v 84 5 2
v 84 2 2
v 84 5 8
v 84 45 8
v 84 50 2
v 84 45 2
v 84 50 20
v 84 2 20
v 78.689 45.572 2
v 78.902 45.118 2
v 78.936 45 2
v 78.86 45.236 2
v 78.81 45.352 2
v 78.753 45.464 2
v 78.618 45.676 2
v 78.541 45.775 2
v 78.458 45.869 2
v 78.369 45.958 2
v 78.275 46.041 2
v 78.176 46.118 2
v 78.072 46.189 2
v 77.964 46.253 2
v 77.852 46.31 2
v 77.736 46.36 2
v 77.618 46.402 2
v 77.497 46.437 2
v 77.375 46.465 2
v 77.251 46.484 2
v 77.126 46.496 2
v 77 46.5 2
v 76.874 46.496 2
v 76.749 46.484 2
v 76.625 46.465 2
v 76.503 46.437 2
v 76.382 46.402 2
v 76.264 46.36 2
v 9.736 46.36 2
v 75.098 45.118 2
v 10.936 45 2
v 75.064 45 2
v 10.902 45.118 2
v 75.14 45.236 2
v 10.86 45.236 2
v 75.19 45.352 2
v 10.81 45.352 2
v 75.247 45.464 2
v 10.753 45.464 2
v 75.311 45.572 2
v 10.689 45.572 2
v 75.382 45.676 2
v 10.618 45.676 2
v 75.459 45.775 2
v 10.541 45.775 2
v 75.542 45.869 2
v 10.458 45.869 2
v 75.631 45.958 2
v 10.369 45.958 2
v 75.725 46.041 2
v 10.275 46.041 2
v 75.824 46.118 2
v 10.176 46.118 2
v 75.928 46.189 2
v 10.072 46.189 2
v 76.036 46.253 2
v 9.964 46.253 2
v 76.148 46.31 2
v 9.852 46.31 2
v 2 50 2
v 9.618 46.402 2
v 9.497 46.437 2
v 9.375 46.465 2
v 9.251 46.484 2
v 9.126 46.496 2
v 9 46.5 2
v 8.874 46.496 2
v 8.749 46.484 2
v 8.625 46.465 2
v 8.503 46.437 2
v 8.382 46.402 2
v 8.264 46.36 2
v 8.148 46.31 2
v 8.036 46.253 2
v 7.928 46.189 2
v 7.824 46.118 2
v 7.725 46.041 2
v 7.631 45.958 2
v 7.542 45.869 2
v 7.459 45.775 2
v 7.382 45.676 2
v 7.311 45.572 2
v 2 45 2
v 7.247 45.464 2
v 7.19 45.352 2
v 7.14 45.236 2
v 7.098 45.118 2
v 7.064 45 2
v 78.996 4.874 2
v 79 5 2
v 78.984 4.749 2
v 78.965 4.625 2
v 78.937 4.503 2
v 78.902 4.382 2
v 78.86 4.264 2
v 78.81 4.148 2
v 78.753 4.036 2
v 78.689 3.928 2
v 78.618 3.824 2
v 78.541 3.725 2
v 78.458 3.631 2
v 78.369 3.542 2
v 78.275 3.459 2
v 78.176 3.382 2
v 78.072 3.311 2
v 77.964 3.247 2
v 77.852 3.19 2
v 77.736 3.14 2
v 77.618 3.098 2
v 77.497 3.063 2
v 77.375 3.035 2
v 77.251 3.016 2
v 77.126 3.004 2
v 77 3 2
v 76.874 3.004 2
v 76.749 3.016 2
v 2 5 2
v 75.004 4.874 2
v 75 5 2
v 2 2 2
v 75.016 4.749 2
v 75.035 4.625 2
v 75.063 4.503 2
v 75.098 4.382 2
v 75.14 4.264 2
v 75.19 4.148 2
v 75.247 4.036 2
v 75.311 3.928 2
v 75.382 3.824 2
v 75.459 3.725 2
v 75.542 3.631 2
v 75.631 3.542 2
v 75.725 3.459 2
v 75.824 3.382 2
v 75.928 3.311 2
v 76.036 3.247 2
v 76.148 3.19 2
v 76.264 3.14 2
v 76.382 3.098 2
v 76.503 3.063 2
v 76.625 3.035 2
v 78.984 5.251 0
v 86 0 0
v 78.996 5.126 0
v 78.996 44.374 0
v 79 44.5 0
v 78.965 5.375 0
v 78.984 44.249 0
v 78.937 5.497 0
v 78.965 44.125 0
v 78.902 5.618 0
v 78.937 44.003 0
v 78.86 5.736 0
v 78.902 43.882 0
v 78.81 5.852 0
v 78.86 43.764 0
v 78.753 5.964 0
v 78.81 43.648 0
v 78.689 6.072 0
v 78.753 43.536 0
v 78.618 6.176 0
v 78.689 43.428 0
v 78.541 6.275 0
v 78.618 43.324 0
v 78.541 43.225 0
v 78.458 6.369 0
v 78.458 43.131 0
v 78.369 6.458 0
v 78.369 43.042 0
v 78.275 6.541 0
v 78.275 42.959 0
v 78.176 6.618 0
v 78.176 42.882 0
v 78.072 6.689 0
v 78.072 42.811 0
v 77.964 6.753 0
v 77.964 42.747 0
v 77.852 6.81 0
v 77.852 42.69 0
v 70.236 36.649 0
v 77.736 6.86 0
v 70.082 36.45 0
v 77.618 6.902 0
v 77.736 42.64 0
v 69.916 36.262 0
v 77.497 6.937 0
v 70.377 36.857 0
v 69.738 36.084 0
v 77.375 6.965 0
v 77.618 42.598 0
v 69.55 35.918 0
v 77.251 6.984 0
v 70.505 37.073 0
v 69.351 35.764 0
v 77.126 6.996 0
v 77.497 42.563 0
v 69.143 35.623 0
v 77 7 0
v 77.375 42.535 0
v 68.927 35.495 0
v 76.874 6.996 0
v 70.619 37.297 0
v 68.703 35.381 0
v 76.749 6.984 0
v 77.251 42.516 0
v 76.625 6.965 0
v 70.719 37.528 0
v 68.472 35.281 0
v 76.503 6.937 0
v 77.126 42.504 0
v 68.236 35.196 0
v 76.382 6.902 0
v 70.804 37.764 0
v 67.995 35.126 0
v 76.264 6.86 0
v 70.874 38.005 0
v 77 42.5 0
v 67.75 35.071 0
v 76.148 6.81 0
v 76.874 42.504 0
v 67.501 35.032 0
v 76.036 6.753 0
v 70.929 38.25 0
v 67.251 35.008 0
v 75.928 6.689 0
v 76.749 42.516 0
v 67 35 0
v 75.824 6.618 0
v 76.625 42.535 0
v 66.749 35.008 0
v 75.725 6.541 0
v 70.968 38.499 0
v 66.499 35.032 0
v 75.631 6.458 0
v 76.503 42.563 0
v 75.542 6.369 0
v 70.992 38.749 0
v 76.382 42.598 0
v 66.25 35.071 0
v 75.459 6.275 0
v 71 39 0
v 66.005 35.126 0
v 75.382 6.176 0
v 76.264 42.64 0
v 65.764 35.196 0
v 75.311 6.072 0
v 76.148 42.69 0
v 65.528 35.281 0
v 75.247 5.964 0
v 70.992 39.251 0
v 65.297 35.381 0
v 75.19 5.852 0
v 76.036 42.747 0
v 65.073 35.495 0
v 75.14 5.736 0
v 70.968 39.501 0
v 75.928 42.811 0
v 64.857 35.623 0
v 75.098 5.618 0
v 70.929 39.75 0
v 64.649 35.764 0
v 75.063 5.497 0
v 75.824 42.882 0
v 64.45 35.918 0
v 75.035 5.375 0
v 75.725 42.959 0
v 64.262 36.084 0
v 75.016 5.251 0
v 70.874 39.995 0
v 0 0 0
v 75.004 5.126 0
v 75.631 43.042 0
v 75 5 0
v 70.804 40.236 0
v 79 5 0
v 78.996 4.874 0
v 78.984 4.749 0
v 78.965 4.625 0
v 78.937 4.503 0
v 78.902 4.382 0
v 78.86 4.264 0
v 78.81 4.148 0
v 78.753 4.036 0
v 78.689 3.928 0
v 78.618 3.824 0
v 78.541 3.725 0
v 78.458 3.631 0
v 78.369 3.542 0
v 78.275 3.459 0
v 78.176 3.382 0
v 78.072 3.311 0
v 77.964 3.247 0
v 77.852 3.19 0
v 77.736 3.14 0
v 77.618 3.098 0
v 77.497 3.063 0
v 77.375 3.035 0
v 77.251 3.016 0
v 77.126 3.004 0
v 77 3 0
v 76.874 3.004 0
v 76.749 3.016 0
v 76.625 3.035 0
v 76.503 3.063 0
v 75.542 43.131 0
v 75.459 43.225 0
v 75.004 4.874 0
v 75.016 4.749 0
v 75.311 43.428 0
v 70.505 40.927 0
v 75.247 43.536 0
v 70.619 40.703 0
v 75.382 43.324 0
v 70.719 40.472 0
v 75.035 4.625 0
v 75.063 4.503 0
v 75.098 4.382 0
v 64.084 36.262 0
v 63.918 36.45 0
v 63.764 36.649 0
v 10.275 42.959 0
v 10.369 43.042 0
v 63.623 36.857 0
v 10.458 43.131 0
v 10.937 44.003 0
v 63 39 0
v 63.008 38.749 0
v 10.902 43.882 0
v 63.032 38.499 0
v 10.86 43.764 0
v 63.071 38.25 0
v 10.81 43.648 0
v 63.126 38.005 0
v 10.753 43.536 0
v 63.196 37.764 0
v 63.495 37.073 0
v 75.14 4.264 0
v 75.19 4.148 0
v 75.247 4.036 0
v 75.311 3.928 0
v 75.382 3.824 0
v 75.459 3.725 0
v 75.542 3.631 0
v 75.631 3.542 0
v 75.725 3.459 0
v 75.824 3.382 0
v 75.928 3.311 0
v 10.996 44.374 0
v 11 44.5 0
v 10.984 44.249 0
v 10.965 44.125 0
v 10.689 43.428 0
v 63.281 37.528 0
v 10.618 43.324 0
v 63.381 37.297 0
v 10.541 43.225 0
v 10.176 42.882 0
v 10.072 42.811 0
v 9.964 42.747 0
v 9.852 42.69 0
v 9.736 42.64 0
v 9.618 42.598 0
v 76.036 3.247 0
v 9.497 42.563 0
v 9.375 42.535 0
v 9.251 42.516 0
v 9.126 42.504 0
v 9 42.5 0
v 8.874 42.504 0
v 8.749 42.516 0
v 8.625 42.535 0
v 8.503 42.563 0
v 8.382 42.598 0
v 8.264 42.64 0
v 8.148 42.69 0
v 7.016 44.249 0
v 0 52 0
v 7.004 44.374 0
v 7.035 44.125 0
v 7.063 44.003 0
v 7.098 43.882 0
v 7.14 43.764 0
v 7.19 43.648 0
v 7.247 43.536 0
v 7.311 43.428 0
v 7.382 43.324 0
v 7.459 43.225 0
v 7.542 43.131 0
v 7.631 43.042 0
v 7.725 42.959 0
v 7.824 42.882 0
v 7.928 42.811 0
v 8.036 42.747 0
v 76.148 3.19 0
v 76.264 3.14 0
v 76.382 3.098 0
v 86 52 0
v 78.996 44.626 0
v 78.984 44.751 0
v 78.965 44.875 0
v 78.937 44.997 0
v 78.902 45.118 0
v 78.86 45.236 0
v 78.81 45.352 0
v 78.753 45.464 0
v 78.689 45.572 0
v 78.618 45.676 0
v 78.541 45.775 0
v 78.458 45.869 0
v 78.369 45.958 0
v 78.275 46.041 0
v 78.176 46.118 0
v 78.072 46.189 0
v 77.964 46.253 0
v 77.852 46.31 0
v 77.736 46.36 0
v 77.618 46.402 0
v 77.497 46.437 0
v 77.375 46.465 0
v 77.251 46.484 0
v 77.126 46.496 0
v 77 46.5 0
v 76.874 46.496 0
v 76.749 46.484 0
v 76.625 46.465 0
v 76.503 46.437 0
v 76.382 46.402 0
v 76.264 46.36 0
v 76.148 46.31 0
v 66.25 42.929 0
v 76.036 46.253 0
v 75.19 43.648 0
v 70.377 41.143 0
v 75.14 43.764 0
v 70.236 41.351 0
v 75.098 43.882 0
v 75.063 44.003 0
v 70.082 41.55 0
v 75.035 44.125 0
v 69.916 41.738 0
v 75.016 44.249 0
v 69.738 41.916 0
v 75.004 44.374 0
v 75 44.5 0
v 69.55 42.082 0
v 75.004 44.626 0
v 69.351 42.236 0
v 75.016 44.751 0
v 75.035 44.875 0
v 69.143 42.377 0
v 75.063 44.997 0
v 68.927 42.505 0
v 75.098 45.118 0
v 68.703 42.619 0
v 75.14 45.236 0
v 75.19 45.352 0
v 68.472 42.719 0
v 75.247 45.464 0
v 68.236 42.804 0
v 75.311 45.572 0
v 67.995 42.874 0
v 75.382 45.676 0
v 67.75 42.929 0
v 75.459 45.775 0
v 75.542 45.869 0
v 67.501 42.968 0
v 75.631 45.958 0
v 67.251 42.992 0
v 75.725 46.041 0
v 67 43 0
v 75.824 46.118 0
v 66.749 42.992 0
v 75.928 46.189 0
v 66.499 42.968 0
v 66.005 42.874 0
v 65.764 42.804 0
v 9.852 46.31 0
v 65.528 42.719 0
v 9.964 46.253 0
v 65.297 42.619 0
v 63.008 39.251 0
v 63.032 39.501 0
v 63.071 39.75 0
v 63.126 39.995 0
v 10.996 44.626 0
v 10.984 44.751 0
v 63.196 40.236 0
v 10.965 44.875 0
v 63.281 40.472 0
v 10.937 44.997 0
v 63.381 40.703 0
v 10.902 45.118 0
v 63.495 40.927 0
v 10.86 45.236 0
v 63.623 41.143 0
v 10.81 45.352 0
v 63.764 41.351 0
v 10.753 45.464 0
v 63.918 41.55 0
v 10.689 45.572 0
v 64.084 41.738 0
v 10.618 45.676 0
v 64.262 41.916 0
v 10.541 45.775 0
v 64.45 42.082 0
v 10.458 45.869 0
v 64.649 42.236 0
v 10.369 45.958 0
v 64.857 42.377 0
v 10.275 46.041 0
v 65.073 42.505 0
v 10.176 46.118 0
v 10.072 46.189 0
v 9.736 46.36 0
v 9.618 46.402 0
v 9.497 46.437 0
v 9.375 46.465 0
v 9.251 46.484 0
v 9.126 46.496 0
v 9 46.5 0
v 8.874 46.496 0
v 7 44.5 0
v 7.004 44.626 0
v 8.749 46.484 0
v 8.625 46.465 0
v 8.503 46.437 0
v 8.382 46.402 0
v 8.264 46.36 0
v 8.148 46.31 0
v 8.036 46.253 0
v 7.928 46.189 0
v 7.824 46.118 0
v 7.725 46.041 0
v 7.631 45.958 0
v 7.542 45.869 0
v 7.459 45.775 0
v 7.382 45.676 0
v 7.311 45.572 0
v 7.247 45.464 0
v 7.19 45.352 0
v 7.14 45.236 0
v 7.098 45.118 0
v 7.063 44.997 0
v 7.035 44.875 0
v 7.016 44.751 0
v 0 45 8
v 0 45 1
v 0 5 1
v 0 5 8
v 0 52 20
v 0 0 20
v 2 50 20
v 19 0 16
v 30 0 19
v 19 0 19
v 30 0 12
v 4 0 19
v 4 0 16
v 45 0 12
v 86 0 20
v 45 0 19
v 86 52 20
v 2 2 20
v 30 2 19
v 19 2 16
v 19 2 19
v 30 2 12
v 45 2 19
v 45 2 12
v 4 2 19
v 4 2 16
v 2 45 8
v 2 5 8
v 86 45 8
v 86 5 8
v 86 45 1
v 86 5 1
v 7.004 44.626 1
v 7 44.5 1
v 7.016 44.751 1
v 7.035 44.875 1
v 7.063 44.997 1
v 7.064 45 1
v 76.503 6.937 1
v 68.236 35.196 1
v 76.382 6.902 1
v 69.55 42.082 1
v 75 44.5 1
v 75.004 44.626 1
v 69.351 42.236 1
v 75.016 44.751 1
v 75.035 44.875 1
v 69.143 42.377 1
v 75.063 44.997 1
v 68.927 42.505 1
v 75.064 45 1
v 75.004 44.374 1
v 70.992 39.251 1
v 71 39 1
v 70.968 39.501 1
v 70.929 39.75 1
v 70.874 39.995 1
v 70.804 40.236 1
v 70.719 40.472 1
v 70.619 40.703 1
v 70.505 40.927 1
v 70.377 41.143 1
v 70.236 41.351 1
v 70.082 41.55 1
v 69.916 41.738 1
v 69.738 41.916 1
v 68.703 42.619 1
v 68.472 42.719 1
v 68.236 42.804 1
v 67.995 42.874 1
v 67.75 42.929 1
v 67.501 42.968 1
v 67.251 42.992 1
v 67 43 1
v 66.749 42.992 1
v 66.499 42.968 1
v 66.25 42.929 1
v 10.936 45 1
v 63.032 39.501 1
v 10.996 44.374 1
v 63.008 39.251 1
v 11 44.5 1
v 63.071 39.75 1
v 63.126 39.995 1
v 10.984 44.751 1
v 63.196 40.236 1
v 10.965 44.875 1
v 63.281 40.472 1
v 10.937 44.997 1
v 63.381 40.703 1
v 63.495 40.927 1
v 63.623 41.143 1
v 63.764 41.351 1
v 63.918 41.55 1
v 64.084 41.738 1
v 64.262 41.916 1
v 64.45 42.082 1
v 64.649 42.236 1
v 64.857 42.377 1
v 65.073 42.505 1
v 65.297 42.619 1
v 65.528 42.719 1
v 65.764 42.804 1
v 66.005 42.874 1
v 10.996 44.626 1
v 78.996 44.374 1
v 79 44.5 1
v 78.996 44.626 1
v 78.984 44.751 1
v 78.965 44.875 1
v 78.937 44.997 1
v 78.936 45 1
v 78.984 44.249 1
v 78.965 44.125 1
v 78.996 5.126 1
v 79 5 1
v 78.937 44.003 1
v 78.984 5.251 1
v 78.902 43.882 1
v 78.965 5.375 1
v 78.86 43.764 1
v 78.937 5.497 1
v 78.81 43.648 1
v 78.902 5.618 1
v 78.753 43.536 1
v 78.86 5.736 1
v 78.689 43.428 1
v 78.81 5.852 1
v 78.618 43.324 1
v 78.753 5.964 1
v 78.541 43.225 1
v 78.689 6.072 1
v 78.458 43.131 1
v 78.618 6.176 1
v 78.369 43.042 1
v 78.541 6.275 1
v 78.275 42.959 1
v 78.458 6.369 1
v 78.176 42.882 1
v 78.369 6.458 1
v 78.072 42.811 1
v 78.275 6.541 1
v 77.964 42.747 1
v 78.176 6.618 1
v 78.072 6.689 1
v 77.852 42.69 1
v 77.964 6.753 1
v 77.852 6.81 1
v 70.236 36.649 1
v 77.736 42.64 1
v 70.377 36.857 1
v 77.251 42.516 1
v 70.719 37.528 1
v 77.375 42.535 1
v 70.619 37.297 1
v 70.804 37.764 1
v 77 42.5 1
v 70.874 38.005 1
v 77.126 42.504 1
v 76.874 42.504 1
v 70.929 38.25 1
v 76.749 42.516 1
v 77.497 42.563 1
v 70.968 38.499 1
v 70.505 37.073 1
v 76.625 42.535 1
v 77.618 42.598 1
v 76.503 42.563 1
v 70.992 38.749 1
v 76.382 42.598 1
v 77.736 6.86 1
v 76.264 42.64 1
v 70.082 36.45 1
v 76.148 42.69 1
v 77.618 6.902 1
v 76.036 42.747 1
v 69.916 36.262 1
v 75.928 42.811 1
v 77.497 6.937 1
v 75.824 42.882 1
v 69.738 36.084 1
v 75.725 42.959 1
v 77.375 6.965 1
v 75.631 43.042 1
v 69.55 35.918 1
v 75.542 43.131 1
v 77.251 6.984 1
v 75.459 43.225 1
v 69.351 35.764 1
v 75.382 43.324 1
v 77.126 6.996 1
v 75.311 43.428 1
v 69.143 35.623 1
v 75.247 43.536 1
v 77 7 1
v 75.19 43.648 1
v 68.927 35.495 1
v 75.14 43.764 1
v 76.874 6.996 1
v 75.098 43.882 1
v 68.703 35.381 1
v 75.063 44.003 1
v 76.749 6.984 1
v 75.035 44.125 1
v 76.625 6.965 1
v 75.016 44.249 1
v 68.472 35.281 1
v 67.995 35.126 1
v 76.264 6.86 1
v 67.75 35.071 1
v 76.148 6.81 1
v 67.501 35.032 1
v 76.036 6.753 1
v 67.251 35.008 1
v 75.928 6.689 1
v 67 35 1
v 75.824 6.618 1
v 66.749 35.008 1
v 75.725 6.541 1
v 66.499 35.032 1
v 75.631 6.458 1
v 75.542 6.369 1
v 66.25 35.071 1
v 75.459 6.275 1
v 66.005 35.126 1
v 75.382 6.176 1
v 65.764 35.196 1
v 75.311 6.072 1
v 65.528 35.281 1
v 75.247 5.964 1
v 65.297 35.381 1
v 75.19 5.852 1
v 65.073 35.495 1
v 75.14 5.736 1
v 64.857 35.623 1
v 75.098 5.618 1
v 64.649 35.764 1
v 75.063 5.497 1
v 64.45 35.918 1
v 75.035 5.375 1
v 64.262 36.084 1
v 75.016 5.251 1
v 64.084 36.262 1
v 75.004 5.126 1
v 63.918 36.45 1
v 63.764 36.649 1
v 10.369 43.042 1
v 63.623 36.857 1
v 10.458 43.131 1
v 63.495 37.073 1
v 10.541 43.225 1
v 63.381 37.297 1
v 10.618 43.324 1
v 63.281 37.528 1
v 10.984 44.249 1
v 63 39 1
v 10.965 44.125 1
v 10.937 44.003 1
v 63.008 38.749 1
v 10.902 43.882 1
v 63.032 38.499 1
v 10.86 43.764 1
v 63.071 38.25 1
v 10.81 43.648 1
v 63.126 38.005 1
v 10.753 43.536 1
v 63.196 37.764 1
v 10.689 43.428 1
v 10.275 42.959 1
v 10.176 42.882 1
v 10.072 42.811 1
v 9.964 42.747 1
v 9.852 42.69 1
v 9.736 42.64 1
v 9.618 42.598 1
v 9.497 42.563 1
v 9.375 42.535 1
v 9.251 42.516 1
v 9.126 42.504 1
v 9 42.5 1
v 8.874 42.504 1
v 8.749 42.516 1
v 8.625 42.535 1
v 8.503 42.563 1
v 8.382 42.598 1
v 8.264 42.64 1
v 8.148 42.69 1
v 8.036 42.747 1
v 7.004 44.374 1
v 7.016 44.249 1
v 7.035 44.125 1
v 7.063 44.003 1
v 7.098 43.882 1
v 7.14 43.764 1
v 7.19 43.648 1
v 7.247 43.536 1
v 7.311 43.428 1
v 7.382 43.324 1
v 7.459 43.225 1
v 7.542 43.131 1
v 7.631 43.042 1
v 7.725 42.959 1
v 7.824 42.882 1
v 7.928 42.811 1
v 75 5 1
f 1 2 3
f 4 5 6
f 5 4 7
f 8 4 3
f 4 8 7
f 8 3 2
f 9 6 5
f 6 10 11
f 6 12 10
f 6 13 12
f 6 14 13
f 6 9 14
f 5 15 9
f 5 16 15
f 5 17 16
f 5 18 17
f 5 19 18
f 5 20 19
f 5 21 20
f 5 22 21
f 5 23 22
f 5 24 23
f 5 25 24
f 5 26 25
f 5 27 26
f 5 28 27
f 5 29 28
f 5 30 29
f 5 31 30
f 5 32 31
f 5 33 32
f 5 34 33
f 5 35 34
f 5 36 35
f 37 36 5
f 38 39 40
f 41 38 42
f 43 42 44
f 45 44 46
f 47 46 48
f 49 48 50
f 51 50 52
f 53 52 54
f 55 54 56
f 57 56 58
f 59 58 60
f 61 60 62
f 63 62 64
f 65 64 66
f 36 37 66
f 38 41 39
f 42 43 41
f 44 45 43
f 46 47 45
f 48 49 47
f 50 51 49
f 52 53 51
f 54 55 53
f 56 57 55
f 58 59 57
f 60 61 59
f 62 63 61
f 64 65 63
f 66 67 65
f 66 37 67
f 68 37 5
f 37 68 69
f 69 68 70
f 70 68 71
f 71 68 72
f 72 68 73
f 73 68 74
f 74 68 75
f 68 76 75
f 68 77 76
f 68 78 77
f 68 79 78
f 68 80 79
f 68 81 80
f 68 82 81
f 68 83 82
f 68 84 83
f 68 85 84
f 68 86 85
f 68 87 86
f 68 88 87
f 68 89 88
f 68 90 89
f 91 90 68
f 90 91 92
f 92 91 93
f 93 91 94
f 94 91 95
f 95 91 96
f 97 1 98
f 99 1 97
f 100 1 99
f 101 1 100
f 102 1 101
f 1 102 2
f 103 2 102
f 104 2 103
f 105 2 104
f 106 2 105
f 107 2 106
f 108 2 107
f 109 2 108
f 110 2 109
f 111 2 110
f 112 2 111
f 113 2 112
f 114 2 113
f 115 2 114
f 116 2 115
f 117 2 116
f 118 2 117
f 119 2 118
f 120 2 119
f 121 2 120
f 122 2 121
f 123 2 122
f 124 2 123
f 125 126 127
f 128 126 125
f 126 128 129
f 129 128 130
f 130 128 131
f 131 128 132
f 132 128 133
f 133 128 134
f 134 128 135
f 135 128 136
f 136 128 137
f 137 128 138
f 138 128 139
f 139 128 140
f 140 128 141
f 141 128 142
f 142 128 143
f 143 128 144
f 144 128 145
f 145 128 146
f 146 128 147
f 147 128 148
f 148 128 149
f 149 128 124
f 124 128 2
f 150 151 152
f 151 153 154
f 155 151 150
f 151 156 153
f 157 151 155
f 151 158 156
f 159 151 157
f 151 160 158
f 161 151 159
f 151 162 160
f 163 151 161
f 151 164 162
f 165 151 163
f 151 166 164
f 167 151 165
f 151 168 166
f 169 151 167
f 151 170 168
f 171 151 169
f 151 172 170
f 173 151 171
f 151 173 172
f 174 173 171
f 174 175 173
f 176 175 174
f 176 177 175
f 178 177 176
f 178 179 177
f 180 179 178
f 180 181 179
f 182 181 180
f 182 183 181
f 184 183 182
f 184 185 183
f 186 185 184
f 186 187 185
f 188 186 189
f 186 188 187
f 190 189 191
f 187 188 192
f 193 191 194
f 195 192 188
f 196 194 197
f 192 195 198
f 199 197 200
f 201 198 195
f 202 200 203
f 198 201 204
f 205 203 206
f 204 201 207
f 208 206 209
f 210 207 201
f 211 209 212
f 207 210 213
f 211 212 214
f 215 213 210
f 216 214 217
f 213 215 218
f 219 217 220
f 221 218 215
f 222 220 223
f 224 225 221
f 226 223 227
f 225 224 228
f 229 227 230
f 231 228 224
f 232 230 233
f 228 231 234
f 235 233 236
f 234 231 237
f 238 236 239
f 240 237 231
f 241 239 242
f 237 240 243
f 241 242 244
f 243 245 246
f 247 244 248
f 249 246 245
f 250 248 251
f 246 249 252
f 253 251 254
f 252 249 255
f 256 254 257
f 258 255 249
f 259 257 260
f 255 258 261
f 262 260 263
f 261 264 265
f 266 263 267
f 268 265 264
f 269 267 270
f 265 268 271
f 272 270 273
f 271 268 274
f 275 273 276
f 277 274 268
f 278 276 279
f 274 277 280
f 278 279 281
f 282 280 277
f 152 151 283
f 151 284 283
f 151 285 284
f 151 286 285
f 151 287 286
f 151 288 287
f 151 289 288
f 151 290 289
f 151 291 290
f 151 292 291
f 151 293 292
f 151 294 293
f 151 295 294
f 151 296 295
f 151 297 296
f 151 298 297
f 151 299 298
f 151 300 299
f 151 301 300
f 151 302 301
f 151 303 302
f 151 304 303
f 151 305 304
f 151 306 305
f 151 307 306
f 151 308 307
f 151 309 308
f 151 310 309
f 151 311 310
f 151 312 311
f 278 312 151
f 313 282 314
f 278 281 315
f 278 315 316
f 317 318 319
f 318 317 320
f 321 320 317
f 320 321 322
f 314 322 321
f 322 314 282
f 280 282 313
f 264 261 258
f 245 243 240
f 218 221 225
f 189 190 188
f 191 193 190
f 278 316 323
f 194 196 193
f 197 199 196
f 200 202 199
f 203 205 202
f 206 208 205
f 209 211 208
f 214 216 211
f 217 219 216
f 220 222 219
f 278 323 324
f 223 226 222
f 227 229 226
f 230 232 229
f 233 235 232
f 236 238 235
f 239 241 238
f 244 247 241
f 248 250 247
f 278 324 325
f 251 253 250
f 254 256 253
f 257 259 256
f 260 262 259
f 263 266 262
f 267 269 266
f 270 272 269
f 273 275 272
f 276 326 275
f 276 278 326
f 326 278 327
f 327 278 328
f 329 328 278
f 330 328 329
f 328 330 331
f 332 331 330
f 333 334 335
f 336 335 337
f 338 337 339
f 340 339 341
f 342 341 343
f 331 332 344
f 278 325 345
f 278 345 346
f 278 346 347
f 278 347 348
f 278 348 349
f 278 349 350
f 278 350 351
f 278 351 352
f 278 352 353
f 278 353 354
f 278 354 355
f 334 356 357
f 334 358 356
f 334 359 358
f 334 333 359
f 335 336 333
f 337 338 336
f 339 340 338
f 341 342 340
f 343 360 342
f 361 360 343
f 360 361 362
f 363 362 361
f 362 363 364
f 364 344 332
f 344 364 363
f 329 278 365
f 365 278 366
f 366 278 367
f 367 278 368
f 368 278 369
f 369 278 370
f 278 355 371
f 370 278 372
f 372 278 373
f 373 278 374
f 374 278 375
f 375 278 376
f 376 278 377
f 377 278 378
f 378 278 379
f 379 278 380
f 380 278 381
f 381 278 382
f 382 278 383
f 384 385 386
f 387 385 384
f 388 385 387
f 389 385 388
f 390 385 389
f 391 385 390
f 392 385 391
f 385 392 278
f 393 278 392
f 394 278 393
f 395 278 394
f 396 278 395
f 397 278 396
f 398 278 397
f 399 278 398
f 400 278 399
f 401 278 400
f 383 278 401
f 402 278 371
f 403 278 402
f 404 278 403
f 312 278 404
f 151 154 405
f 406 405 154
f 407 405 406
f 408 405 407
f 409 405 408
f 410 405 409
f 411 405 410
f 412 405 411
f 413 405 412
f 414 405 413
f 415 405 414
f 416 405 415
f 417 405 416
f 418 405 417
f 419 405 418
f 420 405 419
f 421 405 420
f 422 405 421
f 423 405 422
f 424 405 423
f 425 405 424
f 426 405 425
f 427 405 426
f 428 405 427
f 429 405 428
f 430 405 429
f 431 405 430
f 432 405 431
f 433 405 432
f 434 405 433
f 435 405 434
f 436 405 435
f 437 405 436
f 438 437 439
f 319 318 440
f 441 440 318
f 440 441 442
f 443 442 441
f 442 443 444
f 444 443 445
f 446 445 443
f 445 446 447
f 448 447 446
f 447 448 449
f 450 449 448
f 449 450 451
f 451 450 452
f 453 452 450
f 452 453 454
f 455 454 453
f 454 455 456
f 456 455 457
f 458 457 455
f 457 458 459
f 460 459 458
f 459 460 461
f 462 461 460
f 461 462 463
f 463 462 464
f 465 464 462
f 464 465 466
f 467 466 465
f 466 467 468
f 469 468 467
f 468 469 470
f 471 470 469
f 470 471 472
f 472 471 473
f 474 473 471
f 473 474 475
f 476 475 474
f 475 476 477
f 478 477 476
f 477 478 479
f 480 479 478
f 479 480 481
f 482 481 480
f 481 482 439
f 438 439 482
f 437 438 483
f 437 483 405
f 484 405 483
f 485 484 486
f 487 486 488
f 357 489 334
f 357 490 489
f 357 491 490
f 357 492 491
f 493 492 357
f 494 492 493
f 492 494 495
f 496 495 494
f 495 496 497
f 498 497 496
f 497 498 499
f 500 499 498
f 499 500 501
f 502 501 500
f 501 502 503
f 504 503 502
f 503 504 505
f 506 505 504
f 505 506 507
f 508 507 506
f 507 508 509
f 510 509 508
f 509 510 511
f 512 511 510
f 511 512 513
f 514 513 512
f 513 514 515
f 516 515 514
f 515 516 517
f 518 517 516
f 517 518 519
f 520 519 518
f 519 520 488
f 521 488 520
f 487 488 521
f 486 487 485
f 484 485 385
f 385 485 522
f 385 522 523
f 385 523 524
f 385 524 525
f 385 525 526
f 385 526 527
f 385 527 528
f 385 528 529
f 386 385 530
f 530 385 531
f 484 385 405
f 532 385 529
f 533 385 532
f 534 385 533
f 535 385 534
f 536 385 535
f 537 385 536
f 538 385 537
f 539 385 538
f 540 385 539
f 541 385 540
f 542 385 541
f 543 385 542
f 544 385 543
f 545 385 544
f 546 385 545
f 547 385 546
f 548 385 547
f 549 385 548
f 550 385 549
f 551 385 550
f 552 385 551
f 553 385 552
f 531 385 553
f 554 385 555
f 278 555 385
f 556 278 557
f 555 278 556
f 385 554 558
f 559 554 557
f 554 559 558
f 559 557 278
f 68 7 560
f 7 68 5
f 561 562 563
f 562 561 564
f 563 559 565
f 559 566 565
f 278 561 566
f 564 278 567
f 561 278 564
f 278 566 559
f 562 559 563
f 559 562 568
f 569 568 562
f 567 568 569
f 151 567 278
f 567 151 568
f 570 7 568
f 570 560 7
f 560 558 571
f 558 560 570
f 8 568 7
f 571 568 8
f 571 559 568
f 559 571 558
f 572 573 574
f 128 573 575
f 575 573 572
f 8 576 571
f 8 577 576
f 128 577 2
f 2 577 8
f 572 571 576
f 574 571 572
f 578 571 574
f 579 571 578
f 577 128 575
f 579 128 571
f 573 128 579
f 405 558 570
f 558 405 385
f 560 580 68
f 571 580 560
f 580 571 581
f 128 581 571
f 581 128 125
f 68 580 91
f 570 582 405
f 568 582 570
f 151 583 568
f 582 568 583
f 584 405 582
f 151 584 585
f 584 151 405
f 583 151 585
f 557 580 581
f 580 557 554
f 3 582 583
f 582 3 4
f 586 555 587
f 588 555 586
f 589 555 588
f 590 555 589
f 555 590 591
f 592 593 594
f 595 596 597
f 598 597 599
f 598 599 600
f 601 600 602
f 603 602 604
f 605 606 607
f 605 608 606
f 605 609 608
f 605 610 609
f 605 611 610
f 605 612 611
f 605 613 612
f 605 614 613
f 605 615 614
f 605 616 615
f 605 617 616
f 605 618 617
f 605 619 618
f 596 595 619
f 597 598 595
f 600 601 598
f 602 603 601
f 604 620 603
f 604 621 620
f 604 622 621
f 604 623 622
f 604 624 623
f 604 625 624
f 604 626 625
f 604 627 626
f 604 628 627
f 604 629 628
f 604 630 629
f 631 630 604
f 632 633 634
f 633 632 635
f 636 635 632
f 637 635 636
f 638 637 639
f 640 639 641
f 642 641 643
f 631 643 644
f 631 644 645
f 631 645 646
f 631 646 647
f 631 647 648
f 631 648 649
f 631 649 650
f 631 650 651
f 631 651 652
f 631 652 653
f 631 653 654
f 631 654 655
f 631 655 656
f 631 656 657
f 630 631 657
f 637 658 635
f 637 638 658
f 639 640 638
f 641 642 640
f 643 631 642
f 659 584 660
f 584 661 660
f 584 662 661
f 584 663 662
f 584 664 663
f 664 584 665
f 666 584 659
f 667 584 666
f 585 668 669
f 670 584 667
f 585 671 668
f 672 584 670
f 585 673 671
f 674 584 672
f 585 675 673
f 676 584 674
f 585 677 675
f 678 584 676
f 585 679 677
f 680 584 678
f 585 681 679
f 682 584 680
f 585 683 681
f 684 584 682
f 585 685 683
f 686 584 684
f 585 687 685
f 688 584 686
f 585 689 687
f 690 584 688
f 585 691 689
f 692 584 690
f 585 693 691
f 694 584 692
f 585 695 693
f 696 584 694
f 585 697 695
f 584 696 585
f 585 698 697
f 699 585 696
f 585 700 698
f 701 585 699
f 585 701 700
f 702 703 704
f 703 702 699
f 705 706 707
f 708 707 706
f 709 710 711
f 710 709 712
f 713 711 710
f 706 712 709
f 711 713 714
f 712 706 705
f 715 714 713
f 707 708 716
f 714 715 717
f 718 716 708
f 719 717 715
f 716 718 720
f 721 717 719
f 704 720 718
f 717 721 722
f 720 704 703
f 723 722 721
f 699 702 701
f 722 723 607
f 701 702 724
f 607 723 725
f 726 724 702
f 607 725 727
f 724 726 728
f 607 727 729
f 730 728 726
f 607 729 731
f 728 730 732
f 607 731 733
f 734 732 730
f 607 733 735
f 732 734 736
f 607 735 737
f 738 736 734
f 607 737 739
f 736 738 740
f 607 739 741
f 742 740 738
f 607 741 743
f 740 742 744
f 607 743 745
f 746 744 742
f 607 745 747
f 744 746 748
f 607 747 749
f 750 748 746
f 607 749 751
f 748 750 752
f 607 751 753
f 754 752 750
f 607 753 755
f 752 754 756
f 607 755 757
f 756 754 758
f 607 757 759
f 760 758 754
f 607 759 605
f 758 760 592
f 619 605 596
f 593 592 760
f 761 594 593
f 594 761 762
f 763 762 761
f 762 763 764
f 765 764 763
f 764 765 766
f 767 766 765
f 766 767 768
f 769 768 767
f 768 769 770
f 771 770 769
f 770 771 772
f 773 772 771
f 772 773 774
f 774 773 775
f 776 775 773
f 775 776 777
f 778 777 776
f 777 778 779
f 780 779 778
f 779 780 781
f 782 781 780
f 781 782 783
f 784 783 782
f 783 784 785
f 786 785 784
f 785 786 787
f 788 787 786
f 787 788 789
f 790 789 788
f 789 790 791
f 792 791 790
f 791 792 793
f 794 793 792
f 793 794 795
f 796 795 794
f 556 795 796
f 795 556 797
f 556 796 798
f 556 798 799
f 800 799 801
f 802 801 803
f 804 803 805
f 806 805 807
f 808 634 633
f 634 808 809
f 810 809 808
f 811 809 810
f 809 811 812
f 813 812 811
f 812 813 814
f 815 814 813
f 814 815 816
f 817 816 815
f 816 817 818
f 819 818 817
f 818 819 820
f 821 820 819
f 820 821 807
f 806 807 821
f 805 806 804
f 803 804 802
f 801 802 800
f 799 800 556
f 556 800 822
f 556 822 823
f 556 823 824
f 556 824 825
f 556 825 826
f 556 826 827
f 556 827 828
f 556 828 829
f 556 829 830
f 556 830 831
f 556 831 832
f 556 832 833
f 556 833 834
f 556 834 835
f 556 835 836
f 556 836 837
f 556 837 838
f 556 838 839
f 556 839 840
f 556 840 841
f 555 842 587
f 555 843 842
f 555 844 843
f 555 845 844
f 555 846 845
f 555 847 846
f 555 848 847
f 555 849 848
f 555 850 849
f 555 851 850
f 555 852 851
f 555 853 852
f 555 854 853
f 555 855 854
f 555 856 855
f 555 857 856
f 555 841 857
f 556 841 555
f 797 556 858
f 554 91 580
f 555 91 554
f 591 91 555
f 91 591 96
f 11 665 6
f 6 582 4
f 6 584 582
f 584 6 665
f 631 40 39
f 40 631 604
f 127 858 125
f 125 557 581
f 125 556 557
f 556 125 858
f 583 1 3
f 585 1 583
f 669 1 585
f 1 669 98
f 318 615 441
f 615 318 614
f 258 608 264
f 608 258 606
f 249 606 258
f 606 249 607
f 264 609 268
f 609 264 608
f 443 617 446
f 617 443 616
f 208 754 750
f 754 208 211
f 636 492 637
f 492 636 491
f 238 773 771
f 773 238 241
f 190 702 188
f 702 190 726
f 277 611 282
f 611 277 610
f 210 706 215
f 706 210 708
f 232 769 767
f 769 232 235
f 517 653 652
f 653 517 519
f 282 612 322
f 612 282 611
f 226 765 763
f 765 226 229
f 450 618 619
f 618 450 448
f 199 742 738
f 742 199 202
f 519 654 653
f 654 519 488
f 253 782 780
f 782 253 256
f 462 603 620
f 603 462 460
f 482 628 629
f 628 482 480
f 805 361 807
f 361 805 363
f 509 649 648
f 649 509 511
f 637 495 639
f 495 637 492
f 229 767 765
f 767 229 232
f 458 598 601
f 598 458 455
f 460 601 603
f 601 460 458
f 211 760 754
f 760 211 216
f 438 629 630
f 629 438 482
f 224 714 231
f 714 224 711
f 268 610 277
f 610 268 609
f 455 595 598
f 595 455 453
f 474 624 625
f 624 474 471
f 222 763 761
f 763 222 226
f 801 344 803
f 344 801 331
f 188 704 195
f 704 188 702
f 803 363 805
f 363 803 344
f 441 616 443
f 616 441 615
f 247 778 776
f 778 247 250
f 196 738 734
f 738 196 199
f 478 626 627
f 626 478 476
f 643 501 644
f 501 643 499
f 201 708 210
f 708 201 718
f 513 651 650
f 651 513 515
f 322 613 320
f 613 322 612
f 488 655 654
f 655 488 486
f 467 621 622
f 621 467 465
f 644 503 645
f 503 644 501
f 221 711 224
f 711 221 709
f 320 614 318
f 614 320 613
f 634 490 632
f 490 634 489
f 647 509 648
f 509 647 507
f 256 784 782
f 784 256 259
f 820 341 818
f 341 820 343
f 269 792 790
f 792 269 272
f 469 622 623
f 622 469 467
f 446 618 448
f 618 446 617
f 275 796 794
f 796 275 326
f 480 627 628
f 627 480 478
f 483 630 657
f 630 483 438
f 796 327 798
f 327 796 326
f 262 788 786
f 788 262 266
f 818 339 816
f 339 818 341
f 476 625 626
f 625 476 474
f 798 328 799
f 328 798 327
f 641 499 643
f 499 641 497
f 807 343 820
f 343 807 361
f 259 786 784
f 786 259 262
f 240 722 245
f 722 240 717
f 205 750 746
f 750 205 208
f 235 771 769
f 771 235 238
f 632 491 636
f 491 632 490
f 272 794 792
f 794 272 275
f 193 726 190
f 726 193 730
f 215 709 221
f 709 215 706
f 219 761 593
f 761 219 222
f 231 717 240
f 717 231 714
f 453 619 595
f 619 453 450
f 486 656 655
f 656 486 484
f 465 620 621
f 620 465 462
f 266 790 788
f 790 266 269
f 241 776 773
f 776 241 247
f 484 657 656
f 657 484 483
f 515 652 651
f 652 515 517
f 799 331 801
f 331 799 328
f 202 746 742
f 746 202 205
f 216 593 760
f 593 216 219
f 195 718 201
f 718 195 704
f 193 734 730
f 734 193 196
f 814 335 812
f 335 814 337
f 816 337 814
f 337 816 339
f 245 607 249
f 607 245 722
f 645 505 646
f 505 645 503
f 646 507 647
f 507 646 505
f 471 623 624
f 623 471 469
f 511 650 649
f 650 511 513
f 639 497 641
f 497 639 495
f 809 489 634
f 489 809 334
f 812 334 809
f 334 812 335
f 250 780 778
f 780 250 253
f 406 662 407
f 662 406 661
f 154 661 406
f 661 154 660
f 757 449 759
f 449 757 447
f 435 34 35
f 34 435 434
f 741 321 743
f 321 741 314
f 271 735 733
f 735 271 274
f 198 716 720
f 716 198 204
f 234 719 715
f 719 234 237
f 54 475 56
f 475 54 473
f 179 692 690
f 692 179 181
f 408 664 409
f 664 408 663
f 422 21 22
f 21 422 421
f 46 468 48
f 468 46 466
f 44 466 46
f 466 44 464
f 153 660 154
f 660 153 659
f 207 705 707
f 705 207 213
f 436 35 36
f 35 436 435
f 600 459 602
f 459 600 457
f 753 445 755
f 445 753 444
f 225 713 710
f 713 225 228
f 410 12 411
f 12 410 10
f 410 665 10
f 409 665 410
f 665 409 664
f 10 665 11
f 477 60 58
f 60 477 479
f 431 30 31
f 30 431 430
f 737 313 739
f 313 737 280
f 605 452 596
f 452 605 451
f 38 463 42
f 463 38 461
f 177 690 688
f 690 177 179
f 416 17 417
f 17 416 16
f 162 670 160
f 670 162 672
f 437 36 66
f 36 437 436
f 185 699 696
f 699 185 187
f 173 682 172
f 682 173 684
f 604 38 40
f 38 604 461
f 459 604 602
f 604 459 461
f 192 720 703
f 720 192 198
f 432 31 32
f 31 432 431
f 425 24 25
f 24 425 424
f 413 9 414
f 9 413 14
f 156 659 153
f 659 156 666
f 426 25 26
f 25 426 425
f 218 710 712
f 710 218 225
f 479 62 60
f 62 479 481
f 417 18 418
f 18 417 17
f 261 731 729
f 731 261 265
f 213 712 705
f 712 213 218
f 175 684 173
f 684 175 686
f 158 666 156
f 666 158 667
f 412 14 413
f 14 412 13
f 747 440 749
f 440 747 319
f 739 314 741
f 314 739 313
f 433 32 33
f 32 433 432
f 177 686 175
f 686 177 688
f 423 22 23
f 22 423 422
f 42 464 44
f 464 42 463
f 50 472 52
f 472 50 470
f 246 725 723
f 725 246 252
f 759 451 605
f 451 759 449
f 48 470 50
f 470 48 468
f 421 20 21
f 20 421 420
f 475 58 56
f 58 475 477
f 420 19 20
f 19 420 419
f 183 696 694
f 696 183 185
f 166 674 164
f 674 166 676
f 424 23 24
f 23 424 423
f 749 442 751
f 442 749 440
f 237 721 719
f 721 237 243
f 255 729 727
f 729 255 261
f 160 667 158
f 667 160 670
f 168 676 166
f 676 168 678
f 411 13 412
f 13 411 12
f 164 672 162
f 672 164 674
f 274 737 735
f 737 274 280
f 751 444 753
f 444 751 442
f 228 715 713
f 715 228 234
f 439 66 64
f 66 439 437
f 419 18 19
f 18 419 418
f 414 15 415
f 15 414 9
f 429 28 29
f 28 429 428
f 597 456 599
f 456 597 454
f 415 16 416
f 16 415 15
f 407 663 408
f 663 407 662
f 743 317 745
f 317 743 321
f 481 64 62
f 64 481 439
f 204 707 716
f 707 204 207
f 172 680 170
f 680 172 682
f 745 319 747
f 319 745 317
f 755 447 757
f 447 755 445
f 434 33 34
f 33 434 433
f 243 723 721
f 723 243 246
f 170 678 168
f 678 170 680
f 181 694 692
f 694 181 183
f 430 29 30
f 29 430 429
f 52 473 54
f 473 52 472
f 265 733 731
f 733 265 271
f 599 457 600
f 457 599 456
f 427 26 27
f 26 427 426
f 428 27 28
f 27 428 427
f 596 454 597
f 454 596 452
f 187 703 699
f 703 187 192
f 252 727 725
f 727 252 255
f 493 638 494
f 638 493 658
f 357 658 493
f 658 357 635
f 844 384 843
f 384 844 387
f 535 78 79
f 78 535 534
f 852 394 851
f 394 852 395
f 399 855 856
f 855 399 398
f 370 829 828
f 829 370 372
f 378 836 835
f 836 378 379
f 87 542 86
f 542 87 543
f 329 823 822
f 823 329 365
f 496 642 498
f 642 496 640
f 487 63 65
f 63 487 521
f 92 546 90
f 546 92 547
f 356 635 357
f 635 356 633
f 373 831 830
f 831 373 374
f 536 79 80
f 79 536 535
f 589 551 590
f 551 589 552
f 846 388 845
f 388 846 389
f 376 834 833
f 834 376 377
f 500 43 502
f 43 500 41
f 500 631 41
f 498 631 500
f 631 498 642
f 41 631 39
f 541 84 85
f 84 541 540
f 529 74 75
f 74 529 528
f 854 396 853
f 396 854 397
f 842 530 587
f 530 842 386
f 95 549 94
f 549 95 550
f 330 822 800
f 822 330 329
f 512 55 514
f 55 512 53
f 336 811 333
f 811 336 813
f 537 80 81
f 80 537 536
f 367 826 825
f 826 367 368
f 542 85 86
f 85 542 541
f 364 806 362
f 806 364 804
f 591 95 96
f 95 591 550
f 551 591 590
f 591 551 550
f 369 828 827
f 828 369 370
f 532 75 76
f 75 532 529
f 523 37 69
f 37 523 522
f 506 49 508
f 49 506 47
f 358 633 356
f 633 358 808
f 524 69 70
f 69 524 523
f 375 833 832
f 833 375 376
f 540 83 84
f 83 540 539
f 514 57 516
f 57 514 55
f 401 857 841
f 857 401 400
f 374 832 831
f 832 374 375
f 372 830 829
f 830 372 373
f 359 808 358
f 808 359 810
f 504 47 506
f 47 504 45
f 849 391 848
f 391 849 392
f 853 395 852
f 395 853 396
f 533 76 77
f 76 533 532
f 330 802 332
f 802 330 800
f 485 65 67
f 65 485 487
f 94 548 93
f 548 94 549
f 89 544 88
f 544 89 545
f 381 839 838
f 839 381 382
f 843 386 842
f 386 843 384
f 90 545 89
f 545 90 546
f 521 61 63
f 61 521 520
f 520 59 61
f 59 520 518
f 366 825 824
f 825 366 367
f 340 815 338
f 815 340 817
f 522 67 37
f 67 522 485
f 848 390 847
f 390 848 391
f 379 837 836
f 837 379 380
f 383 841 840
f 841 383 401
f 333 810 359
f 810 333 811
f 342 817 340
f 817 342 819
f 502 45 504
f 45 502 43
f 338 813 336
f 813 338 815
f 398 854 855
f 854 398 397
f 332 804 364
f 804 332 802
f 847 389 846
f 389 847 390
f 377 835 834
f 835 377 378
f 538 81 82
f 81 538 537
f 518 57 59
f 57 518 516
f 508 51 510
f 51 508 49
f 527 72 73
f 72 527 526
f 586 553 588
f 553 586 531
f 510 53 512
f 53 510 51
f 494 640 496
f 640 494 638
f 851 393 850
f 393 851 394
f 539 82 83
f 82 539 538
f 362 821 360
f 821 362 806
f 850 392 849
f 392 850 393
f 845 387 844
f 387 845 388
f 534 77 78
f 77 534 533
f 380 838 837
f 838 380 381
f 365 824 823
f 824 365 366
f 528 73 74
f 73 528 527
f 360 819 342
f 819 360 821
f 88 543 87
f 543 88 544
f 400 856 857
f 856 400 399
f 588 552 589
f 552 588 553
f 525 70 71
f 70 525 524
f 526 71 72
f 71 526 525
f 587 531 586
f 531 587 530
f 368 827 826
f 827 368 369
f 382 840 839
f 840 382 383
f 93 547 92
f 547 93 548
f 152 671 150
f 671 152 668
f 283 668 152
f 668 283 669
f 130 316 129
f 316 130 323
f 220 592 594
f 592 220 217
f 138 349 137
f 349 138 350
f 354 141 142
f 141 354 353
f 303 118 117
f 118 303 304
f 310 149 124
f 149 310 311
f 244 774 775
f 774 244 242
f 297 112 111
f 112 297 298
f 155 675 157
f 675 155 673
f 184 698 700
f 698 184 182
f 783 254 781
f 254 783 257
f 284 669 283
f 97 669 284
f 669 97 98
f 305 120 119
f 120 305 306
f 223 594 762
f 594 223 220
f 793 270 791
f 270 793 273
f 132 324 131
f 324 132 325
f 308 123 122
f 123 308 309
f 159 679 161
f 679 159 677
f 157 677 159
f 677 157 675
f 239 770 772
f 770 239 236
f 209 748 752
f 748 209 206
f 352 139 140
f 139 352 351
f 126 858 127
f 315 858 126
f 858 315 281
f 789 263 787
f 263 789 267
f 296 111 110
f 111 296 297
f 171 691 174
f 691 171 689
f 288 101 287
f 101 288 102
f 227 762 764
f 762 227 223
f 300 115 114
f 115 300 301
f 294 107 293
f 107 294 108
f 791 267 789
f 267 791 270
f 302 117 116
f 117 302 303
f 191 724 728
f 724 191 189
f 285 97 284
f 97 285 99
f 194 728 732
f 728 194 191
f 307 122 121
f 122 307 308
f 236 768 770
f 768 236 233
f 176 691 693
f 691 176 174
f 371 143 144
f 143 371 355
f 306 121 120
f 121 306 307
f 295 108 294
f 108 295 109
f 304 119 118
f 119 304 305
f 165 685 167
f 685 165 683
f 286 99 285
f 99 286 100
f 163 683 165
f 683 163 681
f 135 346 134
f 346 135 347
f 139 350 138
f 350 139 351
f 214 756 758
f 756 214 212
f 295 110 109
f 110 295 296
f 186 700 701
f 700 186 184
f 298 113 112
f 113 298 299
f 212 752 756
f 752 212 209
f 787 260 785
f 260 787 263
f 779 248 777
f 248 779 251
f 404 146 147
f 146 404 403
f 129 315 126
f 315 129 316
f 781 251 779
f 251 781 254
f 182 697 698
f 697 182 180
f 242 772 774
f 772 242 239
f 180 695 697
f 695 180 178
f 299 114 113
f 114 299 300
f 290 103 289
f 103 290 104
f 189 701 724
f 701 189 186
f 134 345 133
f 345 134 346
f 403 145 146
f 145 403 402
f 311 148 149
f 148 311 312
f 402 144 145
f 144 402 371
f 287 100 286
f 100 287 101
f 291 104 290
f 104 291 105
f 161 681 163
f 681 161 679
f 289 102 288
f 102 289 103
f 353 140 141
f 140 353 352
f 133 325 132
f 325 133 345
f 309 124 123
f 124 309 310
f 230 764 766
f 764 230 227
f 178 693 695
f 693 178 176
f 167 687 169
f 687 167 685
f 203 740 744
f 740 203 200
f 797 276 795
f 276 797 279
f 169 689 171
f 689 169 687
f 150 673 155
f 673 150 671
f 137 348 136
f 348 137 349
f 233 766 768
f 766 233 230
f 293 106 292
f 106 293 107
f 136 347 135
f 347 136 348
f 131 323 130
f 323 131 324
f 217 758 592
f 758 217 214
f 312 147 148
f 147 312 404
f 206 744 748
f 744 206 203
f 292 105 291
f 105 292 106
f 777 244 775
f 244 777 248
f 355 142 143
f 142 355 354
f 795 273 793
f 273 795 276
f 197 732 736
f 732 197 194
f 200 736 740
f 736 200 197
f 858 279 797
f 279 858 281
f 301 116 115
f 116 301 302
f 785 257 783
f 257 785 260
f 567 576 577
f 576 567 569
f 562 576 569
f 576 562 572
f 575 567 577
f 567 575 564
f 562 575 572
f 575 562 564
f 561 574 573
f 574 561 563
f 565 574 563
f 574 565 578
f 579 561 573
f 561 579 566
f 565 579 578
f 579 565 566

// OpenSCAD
//no funciono la primera vez que se imprimo por tiempo por que quedo medio impreso 
difference(){
union(){
difference(){
union (){
large= 76;//las medidas de largo del sensor
largo = large+8;//cambio las variables de nombre para que las leea el codigo=84
deep=45;
profundo = deep+5;//50
 paredes=2;
 alto=20;
 tornilloyuno =  44.5;
cube([largo,profundo,paredes]);//base
//translate([0,0,2])//acrilico
//color("blue",0.7)//acrilico
//cube([large,4.7,0.2]);//acrilico
cube([largo,paredes,alto]);//lado  frente
translate([0,profundo,0])//lado trasero
cube([largo,paredes,alto]);//lado  trasero
cube([paredes,profundo,alto]);//lado 1 para micro usb
translate([largo,0,0])//lado 1 para mini usb
cube([paredes,profundo+2,alto]);//lado 1 para mini usb
}translate([-1,5,1])
cube([90,40,7]);}}
union(){
translate([67,39,-1])//grande
cylinder(r=4 ,h=3, $fn=100);}//grande
translate([77,44.5,-1])//pequño y2 x2
cylinder(r=2 ,h=3, $fn=100);
translate([9,44.5,-1])
//pequño y2 x1
cylinder(r=2 ,h=3, $fn=100);
//pequño y1 x2
translate([77,5,-1])
cylinder(r=2 ,h=3, $fn=100);
translate([30,-1,12])
cube ([15,4,7]);
translate([4,-1,16])
cube ([15,5,3]);
}
